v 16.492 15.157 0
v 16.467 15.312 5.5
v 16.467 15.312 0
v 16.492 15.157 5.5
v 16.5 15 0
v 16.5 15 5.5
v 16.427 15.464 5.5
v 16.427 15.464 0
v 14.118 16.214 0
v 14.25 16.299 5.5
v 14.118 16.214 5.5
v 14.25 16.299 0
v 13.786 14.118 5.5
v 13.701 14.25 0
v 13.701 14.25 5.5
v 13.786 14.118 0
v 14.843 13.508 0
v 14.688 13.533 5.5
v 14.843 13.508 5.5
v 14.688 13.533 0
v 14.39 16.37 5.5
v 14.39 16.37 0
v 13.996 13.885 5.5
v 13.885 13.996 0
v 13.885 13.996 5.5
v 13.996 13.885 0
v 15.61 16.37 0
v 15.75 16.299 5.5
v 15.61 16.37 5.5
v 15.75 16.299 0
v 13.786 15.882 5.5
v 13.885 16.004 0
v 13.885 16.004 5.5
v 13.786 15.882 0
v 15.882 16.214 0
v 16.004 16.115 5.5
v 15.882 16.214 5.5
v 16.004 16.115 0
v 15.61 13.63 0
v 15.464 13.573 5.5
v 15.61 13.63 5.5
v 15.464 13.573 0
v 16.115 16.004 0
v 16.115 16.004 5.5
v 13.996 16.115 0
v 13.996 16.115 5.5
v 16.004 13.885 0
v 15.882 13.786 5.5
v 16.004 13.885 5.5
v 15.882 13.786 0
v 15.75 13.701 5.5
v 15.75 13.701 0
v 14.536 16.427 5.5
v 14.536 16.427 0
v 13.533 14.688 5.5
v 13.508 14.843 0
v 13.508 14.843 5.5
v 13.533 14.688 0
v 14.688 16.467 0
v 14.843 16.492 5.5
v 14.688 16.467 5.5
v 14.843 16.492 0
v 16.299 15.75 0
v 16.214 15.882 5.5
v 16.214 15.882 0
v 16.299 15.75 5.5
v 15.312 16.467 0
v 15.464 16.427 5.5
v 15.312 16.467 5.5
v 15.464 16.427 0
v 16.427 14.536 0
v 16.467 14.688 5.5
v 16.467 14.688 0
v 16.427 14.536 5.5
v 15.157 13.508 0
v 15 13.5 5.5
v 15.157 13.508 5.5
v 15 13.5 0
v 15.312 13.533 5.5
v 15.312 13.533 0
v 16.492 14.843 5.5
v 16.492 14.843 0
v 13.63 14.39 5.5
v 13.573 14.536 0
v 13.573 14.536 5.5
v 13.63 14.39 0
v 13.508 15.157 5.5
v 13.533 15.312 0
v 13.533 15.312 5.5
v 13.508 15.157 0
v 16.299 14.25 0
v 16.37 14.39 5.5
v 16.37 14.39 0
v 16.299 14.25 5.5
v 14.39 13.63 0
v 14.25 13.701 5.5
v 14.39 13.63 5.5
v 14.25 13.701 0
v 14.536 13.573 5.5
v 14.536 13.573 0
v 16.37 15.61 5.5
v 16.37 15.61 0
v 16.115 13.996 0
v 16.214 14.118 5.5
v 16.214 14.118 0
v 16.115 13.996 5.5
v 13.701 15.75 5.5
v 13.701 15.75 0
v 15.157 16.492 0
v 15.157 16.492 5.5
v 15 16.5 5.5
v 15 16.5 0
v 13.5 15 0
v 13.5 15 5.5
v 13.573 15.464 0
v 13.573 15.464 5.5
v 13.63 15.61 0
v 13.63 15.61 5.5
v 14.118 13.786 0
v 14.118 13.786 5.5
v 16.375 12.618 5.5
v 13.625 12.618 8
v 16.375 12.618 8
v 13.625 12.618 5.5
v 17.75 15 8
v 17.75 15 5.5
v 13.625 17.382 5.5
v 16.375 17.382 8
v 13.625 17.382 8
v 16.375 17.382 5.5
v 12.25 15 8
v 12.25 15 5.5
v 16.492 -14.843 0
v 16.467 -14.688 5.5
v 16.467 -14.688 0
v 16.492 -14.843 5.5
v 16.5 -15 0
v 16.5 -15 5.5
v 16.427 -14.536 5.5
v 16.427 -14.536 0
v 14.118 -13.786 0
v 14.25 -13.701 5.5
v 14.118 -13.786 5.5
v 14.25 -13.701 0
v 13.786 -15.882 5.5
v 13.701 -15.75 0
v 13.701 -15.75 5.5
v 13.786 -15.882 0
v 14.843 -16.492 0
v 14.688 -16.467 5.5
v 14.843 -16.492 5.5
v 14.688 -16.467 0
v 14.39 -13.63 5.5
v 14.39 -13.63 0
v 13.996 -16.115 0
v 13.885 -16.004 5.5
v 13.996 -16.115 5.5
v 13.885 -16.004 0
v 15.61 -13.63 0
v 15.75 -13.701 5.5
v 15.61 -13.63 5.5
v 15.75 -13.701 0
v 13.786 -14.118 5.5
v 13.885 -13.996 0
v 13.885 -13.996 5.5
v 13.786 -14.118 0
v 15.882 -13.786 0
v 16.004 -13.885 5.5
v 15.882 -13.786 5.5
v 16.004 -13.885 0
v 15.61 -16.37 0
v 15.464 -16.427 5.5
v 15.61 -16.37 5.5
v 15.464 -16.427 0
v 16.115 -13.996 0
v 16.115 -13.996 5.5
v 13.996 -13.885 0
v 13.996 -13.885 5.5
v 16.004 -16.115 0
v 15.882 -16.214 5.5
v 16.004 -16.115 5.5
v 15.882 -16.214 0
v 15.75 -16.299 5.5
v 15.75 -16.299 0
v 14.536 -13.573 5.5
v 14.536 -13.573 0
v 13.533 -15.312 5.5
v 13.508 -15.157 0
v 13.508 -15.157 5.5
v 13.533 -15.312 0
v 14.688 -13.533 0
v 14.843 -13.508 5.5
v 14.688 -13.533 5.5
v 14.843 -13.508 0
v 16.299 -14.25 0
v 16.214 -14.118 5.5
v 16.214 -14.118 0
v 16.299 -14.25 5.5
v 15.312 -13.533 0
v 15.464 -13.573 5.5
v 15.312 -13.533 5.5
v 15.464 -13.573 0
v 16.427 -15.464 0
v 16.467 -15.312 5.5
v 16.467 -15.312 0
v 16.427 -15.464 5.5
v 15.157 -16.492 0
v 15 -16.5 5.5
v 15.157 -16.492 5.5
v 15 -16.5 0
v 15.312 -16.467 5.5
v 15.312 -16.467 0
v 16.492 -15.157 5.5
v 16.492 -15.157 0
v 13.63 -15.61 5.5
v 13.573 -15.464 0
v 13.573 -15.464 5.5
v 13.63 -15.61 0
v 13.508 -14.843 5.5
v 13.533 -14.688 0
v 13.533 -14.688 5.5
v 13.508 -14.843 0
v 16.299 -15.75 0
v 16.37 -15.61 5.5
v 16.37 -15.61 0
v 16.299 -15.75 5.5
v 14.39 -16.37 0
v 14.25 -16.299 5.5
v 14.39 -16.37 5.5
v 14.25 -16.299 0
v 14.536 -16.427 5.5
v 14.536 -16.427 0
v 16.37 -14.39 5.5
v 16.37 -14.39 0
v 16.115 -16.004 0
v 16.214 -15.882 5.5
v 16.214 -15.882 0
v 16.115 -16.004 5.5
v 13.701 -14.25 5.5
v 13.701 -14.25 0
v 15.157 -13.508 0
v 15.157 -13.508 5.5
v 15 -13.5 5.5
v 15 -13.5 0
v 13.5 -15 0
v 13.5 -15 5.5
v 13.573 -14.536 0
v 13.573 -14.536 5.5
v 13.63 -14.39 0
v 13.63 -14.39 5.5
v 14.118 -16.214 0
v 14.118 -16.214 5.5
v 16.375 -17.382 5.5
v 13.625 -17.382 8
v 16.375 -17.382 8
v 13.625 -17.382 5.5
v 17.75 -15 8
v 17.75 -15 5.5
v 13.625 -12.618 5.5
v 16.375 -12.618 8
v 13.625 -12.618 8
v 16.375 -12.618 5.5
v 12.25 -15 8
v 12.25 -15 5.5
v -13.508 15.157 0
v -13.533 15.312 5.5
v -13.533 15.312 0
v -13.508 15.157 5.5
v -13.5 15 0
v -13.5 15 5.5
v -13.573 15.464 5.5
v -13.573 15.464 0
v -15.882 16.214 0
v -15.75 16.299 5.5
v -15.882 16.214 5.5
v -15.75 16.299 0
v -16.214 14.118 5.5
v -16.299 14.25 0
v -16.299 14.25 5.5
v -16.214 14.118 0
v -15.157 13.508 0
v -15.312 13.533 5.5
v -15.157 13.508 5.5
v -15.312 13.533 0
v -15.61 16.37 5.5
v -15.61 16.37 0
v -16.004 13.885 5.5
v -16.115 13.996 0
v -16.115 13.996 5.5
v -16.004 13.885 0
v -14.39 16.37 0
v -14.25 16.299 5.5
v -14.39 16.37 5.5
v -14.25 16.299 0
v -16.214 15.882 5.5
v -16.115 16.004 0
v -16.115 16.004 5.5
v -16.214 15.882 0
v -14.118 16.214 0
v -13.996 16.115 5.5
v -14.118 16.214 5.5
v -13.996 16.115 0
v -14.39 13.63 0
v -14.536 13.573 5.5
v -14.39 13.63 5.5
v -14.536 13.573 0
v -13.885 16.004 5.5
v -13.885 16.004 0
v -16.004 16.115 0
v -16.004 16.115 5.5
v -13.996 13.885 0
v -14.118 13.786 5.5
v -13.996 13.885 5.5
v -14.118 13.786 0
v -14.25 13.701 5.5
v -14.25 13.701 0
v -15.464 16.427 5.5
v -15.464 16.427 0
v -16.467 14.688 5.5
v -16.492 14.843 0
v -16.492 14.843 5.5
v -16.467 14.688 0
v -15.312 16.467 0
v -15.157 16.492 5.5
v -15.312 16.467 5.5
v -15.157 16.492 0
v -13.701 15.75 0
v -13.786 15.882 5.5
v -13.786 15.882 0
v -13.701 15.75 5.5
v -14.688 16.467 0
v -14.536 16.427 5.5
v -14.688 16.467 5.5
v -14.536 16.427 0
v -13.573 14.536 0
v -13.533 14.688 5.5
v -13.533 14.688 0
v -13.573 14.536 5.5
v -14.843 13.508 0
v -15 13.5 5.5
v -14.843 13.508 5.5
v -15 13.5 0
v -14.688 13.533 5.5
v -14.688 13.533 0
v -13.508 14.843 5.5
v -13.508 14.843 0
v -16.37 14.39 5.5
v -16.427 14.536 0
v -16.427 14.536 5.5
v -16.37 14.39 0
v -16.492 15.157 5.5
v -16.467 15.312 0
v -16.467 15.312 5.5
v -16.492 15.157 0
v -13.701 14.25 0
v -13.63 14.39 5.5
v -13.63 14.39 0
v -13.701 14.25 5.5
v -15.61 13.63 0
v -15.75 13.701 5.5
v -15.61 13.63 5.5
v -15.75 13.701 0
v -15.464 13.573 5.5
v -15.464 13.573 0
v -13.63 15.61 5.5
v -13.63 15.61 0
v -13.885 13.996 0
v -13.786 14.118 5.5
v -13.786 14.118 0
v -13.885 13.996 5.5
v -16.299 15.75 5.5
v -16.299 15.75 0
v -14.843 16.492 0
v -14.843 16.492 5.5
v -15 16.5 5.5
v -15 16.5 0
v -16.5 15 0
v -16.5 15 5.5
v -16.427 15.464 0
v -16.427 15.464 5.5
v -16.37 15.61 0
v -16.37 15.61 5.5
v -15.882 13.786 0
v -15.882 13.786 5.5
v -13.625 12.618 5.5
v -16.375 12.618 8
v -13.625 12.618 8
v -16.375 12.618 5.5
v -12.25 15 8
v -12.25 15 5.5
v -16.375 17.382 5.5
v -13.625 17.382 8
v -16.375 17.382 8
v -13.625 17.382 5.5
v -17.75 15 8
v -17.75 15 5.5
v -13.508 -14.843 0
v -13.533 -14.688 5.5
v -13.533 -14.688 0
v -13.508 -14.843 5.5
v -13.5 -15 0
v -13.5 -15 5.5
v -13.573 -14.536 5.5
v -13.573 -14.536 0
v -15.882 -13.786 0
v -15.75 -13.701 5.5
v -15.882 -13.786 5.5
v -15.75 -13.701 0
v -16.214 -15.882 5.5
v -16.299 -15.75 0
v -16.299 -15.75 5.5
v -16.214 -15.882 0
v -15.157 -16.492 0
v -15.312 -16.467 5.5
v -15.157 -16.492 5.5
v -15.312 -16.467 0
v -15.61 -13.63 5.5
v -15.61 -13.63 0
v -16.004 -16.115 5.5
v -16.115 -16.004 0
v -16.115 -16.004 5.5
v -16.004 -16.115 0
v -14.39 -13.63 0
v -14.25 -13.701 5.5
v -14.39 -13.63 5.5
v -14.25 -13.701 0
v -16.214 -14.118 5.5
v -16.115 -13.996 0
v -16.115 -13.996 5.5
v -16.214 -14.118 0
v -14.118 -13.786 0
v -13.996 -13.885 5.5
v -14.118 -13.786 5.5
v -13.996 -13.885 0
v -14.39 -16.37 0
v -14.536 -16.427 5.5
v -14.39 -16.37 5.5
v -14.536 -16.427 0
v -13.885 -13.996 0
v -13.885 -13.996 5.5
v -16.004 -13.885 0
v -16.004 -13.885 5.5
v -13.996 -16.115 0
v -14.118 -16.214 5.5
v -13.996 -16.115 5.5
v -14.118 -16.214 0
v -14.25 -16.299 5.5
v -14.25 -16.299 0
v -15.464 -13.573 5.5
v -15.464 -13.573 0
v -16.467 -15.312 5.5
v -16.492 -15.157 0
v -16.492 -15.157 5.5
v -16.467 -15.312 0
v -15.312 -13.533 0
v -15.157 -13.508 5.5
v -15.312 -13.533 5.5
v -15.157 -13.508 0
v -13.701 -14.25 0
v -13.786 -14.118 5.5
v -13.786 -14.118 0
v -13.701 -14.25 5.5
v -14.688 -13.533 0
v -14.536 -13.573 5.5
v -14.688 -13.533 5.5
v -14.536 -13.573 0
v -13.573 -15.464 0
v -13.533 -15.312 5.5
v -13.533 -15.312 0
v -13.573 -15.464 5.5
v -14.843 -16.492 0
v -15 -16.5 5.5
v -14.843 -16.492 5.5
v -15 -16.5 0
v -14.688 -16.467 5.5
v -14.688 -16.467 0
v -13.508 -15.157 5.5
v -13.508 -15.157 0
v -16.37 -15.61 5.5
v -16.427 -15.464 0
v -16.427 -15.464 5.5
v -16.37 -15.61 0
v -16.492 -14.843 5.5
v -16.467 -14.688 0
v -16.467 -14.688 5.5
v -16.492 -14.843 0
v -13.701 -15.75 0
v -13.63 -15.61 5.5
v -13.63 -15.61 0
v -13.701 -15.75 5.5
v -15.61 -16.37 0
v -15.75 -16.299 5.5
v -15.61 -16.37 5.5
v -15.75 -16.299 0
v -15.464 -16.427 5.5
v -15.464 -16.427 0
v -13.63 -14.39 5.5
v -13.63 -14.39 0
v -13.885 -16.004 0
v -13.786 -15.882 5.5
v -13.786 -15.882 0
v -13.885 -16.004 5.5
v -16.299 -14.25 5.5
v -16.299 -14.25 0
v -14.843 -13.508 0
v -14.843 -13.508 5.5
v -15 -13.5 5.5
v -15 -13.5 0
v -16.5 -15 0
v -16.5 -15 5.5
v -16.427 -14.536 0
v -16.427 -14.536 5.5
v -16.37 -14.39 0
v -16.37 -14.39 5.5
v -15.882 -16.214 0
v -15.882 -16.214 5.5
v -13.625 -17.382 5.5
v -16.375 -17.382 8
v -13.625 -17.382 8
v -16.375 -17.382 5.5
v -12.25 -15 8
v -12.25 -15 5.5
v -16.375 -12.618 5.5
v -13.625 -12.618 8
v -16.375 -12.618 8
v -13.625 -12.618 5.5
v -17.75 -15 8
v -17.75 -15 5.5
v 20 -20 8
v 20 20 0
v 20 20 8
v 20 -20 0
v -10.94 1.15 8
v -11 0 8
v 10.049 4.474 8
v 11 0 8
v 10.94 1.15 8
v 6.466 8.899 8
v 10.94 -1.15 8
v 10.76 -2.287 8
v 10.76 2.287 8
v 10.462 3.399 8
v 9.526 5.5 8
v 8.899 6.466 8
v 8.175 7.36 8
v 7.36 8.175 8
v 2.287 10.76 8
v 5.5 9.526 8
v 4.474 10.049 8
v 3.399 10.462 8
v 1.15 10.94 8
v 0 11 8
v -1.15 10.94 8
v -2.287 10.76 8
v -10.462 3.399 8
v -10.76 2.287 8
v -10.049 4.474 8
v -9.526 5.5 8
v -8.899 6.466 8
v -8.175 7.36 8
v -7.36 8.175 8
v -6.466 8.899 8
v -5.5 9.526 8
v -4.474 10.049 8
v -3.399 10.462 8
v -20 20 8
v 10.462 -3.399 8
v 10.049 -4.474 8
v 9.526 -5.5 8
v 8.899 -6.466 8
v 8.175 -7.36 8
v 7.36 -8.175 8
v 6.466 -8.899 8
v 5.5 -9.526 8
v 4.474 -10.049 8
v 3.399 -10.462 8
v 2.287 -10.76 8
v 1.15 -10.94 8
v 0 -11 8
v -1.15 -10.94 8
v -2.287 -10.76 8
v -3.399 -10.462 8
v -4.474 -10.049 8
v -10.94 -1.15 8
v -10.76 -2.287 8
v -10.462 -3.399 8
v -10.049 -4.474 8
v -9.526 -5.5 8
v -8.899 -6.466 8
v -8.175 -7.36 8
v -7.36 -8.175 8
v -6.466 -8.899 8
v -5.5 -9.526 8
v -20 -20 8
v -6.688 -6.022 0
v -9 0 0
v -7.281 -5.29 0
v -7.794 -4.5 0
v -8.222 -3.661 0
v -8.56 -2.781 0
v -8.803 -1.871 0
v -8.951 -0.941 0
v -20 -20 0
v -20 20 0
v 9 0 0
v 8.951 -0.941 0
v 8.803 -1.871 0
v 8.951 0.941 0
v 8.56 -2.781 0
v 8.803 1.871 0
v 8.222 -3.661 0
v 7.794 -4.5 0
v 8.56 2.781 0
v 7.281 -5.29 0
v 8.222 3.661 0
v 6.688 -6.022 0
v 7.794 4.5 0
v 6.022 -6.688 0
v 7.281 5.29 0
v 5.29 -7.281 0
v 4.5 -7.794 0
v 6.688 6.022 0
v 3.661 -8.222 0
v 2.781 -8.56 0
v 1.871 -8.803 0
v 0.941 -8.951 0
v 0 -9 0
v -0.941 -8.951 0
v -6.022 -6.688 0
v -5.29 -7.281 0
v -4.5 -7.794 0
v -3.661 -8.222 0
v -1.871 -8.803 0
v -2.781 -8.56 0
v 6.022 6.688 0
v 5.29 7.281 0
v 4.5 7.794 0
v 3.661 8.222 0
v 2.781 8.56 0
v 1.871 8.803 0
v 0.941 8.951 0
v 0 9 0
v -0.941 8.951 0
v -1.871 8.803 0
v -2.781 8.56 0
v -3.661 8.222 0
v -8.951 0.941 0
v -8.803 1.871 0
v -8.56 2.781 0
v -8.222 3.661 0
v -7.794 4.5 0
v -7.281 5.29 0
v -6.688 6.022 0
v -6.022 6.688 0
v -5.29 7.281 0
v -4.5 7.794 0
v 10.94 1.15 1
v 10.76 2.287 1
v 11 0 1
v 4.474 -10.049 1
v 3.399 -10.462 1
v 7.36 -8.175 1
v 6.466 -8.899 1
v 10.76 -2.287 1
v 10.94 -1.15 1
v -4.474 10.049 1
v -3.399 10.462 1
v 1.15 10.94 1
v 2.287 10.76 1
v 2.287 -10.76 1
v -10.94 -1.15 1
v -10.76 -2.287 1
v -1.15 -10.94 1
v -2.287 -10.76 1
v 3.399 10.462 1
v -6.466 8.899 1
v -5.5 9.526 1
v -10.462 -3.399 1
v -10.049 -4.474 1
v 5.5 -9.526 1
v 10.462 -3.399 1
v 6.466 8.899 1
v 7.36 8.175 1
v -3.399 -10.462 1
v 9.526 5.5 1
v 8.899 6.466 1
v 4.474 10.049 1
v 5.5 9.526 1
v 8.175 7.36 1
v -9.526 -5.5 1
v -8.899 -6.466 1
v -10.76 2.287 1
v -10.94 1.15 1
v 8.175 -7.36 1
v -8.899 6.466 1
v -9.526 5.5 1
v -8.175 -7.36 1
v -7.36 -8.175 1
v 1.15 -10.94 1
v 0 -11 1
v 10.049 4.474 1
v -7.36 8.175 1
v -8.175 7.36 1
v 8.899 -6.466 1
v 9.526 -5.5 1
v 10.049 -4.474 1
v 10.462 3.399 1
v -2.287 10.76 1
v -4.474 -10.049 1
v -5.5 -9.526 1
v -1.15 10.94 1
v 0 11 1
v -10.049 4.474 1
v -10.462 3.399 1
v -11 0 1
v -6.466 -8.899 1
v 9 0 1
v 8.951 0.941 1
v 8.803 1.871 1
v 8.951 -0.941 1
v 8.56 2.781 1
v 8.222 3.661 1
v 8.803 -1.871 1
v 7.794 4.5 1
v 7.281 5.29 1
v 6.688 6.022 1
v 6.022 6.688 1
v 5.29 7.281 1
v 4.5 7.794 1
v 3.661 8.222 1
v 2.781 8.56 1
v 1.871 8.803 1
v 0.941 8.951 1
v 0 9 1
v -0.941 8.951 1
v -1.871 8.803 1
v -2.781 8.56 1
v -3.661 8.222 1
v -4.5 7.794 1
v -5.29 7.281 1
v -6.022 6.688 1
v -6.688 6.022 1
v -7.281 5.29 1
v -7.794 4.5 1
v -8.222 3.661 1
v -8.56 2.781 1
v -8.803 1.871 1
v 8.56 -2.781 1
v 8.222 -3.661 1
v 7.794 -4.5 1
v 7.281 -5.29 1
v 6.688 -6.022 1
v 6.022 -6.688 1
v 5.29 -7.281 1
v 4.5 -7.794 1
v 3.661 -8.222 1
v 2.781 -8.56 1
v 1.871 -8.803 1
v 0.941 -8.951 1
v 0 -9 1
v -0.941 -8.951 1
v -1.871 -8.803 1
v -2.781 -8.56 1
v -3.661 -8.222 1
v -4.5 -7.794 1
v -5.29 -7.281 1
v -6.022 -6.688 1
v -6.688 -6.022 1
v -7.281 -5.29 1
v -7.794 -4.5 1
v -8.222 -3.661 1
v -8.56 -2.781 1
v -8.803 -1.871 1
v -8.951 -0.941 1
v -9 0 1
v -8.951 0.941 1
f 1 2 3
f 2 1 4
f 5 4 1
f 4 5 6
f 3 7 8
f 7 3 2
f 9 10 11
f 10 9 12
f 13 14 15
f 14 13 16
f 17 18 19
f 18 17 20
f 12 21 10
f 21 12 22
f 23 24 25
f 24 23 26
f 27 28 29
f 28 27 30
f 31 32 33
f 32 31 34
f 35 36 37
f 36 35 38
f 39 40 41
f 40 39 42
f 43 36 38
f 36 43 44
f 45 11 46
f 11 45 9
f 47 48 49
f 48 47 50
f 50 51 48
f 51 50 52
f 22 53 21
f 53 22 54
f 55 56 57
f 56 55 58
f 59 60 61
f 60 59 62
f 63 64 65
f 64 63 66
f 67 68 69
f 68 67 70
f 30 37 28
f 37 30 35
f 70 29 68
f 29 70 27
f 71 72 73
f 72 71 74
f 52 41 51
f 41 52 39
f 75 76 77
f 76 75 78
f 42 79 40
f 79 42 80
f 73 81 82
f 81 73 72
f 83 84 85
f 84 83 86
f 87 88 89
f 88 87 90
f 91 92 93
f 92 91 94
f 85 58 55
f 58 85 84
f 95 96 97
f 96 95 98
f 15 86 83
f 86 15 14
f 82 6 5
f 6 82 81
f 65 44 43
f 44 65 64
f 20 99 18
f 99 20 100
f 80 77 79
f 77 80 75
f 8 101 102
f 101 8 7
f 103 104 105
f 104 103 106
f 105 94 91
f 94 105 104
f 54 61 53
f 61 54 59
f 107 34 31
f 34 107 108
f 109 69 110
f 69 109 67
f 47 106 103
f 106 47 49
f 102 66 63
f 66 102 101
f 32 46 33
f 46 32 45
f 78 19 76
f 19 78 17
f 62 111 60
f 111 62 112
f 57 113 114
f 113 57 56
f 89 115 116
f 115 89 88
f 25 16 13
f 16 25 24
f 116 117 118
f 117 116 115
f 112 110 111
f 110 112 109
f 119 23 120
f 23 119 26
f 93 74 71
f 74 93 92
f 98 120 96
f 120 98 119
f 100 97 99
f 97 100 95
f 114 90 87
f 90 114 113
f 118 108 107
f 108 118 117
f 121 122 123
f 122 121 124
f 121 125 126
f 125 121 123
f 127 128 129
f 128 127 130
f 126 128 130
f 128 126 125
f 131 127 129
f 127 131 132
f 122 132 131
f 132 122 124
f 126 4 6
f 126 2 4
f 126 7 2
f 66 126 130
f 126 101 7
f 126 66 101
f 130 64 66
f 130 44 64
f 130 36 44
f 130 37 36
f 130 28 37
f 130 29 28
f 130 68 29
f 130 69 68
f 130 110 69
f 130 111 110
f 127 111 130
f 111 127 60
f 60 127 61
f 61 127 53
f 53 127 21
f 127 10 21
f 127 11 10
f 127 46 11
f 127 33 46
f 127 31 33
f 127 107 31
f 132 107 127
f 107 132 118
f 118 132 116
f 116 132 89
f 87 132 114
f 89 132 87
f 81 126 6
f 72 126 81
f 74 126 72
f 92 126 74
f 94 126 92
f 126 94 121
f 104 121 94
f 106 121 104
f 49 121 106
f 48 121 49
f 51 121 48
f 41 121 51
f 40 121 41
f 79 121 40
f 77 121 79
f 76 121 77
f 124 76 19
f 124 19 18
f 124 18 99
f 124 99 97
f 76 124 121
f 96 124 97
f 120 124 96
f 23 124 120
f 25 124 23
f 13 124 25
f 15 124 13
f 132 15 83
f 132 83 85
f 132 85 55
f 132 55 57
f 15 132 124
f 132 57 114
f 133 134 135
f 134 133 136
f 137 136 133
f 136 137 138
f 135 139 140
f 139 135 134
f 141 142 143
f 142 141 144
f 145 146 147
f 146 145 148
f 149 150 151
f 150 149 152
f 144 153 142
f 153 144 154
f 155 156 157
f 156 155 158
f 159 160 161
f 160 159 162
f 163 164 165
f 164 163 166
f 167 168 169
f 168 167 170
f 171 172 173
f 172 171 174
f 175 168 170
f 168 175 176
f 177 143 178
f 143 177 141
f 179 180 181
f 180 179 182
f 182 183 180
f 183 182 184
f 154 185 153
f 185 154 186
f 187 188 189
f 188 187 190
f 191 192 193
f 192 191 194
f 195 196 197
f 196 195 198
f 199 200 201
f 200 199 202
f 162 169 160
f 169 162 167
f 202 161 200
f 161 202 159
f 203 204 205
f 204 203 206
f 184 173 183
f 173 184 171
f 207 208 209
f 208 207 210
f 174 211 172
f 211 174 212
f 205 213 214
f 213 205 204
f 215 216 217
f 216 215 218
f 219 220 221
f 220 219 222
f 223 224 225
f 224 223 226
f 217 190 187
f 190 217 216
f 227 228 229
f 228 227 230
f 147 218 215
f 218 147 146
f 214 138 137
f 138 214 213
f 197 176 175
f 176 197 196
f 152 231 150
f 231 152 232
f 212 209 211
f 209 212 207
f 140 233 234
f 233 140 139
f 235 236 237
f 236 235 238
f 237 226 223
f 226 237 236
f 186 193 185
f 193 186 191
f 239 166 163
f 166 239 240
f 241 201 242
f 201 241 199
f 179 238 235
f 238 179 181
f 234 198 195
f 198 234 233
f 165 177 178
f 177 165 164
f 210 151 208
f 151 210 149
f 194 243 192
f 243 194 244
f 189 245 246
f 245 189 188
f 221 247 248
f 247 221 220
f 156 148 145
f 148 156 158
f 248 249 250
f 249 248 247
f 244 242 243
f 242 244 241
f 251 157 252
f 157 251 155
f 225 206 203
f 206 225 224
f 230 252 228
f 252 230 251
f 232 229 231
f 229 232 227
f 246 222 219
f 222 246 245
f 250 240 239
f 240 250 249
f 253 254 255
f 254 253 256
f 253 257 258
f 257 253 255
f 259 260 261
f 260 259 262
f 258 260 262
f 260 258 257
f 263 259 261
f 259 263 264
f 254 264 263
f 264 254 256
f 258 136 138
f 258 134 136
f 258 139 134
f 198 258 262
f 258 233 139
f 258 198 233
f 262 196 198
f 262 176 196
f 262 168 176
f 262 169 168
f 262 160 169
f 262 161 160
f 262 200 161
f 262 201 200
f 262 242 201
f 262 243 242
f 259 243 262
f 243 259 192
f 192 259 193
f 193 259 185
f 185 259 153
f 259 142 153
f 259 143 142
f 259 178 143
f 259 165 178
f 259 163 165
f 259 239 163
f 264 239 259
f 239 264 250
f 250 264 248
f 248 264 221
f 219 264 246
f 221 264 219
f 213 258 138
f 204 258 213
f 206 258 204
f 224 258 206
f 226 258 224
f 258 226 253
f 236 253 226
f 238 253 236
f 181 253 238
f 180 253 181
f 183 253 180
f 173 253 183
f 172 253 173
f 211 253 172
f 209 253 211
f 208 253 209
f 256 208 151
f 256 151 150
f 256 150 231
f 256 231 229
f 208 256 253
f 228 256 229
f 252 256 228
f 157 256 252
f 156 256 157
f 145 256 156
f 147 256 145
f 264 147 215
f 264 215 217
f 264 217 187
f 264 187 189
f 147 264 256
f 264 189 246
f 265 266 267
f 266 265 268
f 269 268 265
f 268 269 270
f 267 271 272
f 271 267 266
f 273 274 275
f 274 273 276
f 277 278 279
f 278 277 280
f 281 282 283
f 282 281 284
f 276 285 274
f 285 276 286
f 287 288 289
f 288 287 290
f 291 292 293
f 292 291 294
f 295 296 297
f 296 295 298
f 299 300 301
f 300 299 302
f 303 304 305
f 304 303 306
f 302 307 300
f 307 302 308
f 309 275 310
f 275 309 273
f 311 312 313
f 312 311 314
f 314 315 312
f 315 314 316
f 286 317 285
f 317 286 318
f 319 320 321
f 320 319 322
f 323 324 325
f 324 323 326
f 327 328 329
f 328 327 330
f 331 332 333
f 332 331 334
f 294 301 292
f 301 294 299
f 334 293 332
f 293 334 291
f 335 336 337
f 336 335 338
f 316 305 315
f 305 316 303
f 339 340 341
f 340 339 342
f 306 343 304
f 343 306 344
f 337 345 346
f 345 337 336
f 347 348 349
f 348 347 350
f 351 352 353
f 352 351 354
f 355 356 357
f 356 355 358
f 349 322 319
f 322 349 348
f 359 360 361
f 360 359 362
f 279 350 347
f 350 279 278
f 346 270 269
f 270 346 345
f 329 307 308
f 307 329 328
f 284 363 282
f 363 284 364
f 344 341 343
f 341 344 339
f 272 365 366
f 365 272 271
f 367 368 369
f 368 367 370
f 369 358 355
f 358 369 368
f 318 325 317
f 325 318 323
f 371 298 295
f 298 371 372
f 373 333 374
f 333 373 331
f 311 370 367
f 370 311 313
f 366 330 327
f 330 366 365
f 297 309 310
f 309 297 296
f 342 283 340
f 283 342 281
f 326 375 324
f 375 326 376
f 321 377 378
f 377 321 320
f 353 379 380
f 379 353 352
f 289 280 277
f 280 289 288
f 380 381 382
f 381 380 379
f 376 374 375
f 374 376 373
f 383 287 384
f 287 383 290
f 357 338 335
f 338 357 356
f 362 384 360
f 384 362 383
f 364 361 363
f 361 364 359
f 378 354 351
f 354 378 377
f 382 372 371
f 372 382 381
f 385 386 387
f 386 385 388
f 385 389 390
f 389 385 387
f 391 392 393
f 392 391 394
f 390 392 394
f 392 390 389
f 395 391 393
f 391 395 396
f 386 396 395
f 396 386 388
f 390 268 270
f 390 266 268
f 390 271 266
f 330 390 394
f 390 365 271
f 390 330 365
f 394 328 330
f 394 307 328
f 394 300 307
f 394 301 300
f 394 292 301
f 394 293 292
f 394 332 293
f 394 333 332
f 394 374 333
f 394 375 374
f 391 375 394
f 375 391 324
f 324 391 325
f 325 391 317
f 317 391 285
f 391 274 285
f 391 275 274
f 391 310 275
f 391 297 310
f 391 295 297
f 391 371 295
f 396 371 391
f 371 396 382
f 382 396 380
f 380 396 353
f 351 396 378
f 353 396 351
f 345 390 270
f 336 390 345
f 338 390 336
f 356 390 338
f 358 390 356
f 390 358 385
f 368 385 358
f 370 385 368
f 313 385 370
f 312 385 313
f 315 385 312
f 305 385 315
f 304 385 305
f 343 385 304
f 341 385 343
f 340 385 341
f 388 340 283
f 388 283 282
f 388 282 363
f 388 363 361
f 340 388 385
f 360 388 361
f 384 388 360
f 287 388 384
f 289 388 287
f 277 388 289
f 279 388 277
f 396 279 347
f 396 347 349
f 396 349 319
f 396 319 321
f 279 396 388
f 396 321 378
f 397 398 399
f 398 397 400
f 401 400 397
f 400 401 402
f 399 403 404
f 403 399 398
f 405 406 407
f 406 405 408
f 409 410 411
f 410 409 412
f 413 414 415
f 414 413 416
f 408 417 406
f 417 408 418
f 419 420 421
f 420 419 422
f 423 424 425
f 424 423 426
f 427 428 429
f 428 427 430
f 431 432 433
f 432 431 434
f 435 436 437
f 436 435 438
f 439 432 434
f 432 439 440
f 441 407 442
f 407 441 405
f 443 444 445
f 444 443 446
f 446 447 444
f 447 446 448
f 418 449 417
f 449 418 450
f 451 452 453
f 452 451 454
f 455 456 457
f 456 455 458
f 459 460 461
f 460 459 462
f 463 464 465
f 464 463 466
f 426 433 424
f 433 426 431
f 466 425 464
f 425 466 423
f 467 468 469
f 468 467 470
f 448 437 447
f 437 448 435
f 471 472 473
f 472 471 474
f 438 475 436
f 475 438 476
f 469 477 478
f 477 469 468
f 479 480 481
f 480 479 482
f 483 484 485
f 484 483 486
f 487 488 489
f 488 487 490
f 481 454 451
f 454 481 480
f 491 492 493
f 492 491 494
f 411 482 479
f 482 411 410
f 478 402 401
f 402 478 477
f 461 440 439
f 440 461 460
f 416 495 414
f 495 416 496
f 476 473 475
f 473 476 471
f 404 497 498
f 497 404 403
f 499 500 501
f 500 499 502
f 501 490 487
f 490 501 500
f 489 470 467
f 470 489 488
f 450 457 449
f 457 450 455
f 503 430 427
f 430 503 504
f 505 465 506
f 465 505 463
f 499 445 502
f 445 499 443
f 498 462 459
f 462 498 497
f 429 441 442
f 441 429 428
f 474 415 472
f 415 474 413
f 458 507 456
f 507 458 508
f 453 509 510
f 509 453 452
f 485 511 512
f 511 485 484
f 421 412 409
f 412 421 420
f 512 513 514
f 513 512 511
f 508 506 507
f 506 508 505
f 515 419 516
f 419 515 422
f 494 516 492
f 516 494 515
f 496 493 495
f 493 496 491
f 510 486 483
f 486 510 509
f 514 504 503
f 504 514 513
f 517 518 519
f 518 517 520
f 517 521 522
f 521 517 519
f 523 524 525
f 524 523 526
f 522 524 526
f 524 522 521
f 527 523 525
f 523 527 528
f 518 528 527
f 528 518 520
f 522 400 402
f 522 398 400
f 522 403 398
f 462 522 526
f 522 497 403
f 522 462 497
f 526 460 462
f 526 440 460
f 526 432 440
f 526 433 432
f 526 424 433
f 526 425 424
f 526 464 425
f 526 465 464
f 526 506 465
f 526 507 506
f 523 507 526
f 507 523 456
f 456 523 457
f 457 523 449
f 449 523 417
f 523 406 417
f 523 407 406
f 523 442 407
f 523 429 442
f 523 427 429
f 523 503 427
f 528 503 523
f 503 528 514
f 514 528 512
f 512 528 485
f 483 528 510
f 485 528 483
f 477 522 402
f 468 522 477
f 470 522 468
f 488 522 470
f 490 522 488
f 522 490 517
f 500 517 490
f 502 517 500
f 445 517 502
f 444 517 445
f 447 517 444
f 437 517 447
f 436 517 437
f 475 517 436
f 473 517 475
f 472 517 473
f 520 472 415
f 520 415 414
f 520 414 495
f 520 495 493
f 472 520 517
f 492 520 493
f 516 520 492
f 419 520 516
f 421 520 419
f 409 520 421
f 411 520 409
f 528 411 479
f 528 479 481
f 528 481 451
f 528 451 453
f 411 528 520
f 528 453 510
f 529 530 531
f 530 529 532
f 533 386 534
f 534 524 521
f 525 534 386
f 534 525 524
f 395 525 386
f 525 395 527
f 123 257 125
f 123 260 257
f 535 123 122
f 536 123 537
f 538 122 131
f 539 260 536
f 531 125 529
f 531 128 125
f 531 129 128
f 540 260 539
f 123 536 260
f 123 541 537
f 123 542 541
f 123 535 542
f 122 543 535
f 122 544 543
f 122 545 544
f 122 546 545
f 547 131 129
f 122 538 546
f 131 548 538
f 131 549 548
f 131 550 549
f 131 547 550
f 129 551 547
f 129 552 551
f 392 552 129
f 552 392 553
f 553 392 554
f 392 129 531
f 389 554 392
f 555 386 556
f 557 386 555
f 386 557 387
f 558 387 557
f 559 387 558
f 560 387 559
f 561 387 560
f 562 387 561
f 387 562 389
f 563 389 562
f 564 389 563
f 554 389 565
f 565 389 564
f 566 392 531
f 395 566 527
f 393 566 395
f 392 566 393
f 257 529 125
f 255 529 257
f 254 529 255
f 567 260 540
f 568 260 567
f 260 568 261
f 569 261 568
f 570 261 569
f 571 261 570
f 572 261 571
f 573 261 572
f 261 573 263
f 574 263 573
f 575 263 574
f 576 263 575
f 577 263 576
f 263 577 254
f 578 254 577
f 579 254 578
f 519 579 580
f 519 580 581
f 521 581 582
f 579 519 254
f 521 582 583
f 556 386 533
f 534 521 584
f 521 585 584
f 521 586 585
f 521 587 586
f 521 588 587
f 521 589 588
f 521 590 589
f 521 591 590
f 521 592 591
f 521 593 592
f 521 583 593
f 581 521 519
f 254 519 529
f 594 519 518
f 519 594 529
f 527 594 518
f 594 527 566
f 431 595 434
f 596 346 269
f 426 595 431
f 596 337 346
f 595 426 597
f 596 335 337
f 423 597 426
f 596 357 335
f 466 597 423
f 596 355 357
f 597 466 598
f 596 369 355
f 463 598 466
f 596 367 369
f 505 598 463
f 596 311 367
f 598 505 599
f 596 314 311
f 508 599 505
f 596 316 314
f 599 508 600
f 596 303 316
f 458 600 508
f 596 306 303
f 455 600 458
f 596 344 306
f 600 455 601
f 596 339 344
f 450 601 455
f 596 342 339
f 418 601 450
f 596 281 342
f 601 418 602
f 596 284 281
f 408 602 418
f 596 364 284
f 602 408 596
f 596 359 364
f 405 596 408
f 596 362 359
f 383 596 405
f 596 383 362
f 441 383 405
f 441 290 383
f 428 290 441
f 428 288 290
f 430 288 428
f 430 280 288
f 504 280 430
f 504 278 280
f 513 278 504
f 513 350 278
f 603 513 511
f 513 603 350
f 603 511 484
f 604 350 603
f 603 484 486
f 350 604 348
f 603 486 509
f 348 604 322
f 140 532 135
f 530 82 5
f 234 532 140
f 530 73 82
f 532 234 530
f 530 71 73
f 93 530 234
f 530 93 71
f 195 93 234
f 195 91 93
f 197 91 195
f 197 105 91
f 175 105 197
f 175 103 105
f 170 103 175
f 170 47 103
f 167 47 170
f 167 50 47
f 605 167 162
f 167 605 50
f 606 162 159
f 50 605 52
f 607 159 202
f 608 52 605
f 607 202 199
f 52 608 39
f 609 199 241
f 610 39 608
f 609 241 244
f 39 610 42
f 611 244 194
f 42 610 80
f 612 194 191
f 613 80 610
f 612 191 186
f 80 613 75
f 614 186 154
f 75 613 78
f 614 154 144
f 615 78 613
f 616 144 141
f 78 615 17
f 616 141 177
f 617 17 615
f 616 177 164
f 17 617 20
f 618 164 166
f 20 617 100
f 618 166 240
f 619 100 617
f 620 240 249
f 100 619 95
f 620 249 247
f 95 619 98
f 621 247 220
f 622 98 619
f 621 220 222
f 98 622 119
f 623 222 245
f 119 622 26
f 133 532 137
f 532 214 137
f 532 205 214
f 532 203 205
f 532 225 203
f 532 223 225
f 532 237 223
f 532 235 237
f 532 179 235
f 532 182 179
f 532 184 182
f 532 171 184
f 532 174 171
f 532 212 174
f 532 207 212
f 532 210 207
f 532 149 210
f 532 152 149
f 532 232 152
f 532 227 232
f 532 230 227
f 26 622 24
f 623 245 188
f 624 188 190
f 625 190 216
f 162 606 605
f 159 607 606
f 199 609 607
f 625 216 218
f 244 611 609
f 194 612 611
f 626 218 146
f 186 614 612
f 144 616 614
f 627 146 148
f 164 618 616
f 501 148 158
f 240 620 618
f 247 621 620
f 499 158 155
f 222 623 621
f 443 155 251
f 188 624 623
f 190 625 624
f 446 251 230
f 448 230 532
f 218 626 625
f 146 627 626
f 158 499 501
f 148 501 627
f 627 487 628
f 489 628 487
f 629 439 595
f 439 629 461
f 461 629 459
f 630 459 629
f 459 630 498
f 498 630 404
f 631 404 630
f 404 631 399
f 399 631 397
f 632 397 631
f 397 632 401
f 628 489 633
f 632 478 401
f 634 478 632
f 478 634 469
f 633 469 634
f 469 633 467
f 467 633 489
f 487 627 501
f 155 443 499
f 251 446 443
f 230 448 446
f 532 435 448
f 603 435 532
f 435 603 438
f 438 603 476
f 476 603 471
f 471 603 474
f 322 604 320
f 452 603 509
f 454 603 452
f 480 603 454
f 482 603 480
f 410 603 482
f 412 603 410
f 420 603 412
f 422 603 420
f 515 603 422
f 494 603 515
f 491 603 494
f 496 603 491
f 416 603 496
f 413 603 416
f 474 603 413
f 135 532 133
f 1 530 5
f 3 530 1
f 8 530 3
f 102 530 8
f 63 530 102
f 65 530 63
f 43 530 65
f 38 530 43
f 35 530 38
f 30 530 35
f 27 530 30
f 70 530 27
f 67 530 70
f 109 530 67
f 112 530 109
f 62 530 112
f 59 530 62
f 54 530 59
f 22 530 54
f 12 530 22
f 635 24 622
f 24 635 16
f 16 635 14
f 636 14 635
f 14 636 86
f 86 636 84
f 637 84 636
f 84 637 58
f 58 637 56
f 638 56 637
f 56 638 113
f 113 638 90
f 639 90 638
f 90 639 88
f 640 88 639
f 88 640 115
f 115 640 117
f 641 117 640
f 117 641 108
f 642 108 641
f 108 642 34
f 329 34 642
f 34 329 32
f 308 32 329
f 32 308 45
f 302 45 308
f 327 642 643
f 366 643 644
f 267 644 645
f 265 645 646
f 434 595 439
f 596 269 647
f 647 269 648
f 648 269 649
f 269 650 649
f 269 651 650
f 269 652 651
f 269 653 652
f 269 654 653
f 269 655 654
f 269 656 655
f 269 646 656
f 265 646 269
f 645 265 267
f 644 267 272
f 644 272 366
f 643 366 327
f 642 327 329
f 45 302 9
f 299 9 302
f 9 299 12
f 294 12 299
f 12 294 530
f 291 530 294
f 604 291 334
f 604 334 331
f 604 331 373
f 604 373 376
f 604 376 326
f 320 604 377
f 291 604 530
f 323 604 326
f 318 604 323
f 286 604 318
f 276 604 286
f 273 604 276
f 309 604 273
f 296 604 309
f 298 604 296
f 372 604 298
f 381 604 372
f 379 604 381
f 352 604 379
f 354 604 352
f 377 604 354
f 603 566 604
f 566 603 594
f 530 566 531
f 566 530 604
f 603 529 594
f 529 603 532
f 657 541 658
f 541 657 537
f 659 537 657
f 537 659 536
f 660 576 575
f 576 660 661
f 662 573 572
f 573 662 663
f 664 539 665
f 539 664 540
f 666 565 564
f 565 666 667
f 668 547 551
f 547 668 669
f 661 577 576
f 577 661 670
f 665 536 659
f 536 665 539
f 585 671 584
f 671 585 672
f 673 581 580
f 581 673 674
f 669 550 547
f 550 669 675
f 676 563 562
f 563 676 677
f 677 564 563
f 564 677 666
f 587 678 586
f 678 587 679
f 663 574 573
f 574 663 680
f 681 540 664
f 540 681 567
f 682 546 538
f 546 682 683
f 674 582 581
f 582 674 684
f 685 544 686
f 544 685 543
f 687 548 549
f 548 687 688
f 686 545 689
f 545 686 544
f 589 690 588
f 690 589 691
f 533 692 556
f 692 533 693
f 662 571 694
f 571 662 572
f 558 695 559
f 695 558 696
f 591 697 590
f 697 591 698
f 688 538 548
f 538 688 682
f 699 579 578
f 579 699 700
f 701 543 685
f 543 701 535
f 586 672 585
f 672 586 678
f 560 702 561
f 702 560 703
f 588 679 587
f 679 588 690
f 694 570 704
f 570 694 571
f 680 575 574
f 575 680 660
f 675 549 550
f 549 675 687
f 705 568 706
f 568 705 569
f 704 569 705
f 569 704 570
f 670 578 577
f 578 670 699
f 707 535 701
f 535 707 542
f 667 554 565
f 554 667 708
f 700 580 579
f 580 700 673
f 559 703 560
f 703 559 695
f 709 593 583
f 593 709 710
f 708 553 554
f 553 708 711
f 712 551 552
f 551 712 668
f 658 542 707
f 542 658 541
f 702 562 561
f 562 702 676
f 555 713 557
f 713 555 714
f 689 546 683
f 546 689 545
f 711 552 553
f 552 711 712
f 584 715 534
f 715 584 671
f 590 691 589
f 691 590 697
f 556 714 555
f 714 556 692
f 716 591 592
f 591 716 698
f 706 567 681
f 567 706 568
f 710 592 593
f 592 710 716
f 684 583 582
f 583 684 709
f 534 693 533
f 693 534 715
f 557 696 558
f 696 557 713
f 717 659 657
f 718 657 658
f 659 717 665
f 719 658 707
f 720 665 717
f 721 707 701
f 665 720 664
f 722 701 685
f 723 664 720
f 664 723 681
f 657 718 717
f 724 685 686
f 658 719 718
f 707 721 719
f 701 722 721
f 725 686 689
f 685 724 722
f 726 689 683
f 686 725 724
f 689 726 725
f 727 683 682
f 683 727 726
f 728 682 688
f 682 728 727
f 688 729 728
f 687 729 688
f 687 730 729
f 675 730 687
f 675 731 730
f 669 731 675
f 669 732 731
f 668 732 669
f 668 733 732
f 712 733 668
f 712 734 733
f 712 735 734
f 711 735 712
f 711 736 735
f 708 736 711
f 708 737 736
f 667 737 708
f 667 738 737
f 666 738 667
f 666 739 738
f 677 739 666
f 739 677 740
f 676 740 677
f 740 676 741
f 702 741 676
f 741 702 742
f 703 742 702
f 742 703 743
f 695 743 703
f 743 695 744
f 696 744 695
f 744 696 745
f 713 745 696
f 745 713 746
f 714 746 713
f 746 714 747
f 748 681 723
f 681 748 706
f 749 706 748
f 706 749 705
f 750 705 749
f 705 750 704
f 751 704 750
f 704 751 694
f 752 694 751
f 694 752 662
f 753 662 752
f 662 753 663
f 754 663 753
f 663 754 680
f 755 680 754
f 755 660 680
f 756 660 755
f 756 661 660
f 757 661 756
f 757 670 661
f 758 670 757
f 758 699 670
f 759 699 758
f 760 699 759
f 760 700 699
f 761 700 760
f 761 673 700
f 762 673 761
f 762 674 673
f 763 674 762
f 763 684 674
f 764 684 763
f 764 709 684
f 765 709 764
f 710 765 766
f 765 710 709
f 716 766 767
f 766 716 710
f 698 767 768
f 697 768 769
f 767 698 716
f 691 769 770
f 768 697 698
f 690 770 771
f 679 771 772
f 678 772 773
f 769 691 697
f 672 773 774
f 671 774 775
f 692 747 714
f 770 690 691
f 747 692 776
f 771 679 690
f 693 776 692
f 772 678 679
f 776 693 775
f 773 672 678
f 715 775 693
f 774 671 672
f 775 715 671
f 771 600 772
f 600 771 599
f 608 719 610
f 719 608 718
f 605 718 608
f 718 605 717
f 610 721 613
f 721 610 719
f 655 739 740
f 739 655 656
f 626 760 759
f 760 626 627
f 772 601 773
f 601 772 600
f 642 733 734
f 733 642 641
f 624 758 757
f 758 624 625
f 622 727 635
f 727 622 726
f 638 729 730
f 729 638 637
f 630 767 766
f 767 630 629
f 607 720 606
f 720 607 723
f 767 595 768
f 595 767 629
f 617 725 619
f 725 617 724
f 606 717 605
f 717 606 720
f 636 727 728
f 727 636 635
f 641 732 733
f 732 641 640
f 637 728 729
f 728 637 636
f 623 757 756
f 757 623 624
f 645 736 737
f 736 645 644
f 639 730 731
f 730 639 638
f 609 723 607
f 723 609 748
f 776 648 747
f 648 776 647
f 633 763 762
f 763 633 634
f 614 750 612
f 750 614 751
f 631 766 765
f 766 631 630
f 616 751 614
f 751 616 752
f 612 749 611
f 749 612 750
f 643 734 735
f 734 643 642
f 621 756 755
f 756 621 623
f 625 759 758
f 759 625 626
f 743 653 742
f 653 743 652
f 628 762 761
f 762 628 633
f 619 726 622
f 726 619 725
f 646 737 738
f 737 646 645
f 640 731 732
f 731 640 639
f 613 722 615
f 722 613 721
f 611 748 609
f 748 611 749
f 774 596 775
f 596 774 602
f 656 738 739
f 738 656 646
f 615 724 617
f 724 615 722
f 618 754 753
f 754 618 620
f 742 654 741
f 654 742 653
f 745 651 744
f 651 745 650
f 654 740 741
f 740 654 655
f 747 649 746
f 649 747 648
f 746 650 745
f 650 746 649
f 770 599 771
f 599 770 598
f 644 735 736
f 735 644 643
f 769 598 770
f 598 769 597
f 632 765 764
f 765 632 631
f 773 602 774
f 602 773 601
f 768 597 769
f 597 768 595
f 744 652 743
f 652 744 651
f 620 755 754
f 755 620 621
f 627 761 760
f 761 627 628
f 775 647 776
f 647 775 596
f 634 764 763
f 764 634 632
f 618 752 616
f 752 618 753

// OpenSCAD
height = 8;
width = 40;
bearing_outer_diameter = 22;
bearing_height = 7; 
flange_inner_diameter = 18;
bolt_center_distance_from_edge = 5;
bolt_diameter = 3;
nut_diameter = 5.5;
nut_height = 2.5;
translate([0,0,height/2]){
    union(){
        difference(){
            cube([width, width, height], center = true);
            cylinder(r = bearing_outer_diameter/2, h = height*1.1, center = true, $fn=60);
            translate([width/2-bolt_center_distance_from_edge, width/2-bolt_center_distance_from_edge, 0]){
                cylinder(r = bolt_diameter/2, h = height*1.1, center = true, $fn=60);
                translate([0,0,height-nut_height]){
                      cylinder(r = nut_diameter/2, h = height, center = true, $fn=6);  
                }
            }
            translate([width/2-bolt_center_distance_from_edge, -width/2+bolt_center_distance_from_edge, 0]){
                cylinder(r = bolt_diameter/2, h = height*1.1, center = true, $fn=60);
                translate([0,0,height-nut_height]){
                      cylinder(r = nut_diameter/2, h = height, center = true, $fn=6);  
                }
            }
            translate([-width/2+bolt_center_distance_from_edge, width/2-bolt_center_distance_from_edge, 0]){
                cylinder(r = bolt_diameter/2, h = height*1.1, center = true, $fn=60);
                translate([0,0,height-nut_height]){
                      cylinder(r = nut_diameter/2, h = height, center = true, $fn=6);  
                }
            }
            translate([-width/2+bolt_center_distance_from_edge, -width/2+bolt_center_distance_from_edge, 0]){
                cylinder(r = bolt_diameter/2, h = height*1.1, center = true, $fn=60);
                translate([0,0,height-nut_height]){
                      cylinder(r = nut_diameter/2, h = height, center = true, $fn=6);  
                }
            }
            
        }
        translate([0,0,-(height/2-(height-bearing_height)/2)]){
            difference(){
                cylinder(r = bearing_outer_diameter/2, h = height-bearing_height, center = true, $fn=60);
                cylinder(r = flange_inner_diameter/2, h = (height-bearing_height)*1.1, center = true, $fn=60);
            }
        }
    }
}
